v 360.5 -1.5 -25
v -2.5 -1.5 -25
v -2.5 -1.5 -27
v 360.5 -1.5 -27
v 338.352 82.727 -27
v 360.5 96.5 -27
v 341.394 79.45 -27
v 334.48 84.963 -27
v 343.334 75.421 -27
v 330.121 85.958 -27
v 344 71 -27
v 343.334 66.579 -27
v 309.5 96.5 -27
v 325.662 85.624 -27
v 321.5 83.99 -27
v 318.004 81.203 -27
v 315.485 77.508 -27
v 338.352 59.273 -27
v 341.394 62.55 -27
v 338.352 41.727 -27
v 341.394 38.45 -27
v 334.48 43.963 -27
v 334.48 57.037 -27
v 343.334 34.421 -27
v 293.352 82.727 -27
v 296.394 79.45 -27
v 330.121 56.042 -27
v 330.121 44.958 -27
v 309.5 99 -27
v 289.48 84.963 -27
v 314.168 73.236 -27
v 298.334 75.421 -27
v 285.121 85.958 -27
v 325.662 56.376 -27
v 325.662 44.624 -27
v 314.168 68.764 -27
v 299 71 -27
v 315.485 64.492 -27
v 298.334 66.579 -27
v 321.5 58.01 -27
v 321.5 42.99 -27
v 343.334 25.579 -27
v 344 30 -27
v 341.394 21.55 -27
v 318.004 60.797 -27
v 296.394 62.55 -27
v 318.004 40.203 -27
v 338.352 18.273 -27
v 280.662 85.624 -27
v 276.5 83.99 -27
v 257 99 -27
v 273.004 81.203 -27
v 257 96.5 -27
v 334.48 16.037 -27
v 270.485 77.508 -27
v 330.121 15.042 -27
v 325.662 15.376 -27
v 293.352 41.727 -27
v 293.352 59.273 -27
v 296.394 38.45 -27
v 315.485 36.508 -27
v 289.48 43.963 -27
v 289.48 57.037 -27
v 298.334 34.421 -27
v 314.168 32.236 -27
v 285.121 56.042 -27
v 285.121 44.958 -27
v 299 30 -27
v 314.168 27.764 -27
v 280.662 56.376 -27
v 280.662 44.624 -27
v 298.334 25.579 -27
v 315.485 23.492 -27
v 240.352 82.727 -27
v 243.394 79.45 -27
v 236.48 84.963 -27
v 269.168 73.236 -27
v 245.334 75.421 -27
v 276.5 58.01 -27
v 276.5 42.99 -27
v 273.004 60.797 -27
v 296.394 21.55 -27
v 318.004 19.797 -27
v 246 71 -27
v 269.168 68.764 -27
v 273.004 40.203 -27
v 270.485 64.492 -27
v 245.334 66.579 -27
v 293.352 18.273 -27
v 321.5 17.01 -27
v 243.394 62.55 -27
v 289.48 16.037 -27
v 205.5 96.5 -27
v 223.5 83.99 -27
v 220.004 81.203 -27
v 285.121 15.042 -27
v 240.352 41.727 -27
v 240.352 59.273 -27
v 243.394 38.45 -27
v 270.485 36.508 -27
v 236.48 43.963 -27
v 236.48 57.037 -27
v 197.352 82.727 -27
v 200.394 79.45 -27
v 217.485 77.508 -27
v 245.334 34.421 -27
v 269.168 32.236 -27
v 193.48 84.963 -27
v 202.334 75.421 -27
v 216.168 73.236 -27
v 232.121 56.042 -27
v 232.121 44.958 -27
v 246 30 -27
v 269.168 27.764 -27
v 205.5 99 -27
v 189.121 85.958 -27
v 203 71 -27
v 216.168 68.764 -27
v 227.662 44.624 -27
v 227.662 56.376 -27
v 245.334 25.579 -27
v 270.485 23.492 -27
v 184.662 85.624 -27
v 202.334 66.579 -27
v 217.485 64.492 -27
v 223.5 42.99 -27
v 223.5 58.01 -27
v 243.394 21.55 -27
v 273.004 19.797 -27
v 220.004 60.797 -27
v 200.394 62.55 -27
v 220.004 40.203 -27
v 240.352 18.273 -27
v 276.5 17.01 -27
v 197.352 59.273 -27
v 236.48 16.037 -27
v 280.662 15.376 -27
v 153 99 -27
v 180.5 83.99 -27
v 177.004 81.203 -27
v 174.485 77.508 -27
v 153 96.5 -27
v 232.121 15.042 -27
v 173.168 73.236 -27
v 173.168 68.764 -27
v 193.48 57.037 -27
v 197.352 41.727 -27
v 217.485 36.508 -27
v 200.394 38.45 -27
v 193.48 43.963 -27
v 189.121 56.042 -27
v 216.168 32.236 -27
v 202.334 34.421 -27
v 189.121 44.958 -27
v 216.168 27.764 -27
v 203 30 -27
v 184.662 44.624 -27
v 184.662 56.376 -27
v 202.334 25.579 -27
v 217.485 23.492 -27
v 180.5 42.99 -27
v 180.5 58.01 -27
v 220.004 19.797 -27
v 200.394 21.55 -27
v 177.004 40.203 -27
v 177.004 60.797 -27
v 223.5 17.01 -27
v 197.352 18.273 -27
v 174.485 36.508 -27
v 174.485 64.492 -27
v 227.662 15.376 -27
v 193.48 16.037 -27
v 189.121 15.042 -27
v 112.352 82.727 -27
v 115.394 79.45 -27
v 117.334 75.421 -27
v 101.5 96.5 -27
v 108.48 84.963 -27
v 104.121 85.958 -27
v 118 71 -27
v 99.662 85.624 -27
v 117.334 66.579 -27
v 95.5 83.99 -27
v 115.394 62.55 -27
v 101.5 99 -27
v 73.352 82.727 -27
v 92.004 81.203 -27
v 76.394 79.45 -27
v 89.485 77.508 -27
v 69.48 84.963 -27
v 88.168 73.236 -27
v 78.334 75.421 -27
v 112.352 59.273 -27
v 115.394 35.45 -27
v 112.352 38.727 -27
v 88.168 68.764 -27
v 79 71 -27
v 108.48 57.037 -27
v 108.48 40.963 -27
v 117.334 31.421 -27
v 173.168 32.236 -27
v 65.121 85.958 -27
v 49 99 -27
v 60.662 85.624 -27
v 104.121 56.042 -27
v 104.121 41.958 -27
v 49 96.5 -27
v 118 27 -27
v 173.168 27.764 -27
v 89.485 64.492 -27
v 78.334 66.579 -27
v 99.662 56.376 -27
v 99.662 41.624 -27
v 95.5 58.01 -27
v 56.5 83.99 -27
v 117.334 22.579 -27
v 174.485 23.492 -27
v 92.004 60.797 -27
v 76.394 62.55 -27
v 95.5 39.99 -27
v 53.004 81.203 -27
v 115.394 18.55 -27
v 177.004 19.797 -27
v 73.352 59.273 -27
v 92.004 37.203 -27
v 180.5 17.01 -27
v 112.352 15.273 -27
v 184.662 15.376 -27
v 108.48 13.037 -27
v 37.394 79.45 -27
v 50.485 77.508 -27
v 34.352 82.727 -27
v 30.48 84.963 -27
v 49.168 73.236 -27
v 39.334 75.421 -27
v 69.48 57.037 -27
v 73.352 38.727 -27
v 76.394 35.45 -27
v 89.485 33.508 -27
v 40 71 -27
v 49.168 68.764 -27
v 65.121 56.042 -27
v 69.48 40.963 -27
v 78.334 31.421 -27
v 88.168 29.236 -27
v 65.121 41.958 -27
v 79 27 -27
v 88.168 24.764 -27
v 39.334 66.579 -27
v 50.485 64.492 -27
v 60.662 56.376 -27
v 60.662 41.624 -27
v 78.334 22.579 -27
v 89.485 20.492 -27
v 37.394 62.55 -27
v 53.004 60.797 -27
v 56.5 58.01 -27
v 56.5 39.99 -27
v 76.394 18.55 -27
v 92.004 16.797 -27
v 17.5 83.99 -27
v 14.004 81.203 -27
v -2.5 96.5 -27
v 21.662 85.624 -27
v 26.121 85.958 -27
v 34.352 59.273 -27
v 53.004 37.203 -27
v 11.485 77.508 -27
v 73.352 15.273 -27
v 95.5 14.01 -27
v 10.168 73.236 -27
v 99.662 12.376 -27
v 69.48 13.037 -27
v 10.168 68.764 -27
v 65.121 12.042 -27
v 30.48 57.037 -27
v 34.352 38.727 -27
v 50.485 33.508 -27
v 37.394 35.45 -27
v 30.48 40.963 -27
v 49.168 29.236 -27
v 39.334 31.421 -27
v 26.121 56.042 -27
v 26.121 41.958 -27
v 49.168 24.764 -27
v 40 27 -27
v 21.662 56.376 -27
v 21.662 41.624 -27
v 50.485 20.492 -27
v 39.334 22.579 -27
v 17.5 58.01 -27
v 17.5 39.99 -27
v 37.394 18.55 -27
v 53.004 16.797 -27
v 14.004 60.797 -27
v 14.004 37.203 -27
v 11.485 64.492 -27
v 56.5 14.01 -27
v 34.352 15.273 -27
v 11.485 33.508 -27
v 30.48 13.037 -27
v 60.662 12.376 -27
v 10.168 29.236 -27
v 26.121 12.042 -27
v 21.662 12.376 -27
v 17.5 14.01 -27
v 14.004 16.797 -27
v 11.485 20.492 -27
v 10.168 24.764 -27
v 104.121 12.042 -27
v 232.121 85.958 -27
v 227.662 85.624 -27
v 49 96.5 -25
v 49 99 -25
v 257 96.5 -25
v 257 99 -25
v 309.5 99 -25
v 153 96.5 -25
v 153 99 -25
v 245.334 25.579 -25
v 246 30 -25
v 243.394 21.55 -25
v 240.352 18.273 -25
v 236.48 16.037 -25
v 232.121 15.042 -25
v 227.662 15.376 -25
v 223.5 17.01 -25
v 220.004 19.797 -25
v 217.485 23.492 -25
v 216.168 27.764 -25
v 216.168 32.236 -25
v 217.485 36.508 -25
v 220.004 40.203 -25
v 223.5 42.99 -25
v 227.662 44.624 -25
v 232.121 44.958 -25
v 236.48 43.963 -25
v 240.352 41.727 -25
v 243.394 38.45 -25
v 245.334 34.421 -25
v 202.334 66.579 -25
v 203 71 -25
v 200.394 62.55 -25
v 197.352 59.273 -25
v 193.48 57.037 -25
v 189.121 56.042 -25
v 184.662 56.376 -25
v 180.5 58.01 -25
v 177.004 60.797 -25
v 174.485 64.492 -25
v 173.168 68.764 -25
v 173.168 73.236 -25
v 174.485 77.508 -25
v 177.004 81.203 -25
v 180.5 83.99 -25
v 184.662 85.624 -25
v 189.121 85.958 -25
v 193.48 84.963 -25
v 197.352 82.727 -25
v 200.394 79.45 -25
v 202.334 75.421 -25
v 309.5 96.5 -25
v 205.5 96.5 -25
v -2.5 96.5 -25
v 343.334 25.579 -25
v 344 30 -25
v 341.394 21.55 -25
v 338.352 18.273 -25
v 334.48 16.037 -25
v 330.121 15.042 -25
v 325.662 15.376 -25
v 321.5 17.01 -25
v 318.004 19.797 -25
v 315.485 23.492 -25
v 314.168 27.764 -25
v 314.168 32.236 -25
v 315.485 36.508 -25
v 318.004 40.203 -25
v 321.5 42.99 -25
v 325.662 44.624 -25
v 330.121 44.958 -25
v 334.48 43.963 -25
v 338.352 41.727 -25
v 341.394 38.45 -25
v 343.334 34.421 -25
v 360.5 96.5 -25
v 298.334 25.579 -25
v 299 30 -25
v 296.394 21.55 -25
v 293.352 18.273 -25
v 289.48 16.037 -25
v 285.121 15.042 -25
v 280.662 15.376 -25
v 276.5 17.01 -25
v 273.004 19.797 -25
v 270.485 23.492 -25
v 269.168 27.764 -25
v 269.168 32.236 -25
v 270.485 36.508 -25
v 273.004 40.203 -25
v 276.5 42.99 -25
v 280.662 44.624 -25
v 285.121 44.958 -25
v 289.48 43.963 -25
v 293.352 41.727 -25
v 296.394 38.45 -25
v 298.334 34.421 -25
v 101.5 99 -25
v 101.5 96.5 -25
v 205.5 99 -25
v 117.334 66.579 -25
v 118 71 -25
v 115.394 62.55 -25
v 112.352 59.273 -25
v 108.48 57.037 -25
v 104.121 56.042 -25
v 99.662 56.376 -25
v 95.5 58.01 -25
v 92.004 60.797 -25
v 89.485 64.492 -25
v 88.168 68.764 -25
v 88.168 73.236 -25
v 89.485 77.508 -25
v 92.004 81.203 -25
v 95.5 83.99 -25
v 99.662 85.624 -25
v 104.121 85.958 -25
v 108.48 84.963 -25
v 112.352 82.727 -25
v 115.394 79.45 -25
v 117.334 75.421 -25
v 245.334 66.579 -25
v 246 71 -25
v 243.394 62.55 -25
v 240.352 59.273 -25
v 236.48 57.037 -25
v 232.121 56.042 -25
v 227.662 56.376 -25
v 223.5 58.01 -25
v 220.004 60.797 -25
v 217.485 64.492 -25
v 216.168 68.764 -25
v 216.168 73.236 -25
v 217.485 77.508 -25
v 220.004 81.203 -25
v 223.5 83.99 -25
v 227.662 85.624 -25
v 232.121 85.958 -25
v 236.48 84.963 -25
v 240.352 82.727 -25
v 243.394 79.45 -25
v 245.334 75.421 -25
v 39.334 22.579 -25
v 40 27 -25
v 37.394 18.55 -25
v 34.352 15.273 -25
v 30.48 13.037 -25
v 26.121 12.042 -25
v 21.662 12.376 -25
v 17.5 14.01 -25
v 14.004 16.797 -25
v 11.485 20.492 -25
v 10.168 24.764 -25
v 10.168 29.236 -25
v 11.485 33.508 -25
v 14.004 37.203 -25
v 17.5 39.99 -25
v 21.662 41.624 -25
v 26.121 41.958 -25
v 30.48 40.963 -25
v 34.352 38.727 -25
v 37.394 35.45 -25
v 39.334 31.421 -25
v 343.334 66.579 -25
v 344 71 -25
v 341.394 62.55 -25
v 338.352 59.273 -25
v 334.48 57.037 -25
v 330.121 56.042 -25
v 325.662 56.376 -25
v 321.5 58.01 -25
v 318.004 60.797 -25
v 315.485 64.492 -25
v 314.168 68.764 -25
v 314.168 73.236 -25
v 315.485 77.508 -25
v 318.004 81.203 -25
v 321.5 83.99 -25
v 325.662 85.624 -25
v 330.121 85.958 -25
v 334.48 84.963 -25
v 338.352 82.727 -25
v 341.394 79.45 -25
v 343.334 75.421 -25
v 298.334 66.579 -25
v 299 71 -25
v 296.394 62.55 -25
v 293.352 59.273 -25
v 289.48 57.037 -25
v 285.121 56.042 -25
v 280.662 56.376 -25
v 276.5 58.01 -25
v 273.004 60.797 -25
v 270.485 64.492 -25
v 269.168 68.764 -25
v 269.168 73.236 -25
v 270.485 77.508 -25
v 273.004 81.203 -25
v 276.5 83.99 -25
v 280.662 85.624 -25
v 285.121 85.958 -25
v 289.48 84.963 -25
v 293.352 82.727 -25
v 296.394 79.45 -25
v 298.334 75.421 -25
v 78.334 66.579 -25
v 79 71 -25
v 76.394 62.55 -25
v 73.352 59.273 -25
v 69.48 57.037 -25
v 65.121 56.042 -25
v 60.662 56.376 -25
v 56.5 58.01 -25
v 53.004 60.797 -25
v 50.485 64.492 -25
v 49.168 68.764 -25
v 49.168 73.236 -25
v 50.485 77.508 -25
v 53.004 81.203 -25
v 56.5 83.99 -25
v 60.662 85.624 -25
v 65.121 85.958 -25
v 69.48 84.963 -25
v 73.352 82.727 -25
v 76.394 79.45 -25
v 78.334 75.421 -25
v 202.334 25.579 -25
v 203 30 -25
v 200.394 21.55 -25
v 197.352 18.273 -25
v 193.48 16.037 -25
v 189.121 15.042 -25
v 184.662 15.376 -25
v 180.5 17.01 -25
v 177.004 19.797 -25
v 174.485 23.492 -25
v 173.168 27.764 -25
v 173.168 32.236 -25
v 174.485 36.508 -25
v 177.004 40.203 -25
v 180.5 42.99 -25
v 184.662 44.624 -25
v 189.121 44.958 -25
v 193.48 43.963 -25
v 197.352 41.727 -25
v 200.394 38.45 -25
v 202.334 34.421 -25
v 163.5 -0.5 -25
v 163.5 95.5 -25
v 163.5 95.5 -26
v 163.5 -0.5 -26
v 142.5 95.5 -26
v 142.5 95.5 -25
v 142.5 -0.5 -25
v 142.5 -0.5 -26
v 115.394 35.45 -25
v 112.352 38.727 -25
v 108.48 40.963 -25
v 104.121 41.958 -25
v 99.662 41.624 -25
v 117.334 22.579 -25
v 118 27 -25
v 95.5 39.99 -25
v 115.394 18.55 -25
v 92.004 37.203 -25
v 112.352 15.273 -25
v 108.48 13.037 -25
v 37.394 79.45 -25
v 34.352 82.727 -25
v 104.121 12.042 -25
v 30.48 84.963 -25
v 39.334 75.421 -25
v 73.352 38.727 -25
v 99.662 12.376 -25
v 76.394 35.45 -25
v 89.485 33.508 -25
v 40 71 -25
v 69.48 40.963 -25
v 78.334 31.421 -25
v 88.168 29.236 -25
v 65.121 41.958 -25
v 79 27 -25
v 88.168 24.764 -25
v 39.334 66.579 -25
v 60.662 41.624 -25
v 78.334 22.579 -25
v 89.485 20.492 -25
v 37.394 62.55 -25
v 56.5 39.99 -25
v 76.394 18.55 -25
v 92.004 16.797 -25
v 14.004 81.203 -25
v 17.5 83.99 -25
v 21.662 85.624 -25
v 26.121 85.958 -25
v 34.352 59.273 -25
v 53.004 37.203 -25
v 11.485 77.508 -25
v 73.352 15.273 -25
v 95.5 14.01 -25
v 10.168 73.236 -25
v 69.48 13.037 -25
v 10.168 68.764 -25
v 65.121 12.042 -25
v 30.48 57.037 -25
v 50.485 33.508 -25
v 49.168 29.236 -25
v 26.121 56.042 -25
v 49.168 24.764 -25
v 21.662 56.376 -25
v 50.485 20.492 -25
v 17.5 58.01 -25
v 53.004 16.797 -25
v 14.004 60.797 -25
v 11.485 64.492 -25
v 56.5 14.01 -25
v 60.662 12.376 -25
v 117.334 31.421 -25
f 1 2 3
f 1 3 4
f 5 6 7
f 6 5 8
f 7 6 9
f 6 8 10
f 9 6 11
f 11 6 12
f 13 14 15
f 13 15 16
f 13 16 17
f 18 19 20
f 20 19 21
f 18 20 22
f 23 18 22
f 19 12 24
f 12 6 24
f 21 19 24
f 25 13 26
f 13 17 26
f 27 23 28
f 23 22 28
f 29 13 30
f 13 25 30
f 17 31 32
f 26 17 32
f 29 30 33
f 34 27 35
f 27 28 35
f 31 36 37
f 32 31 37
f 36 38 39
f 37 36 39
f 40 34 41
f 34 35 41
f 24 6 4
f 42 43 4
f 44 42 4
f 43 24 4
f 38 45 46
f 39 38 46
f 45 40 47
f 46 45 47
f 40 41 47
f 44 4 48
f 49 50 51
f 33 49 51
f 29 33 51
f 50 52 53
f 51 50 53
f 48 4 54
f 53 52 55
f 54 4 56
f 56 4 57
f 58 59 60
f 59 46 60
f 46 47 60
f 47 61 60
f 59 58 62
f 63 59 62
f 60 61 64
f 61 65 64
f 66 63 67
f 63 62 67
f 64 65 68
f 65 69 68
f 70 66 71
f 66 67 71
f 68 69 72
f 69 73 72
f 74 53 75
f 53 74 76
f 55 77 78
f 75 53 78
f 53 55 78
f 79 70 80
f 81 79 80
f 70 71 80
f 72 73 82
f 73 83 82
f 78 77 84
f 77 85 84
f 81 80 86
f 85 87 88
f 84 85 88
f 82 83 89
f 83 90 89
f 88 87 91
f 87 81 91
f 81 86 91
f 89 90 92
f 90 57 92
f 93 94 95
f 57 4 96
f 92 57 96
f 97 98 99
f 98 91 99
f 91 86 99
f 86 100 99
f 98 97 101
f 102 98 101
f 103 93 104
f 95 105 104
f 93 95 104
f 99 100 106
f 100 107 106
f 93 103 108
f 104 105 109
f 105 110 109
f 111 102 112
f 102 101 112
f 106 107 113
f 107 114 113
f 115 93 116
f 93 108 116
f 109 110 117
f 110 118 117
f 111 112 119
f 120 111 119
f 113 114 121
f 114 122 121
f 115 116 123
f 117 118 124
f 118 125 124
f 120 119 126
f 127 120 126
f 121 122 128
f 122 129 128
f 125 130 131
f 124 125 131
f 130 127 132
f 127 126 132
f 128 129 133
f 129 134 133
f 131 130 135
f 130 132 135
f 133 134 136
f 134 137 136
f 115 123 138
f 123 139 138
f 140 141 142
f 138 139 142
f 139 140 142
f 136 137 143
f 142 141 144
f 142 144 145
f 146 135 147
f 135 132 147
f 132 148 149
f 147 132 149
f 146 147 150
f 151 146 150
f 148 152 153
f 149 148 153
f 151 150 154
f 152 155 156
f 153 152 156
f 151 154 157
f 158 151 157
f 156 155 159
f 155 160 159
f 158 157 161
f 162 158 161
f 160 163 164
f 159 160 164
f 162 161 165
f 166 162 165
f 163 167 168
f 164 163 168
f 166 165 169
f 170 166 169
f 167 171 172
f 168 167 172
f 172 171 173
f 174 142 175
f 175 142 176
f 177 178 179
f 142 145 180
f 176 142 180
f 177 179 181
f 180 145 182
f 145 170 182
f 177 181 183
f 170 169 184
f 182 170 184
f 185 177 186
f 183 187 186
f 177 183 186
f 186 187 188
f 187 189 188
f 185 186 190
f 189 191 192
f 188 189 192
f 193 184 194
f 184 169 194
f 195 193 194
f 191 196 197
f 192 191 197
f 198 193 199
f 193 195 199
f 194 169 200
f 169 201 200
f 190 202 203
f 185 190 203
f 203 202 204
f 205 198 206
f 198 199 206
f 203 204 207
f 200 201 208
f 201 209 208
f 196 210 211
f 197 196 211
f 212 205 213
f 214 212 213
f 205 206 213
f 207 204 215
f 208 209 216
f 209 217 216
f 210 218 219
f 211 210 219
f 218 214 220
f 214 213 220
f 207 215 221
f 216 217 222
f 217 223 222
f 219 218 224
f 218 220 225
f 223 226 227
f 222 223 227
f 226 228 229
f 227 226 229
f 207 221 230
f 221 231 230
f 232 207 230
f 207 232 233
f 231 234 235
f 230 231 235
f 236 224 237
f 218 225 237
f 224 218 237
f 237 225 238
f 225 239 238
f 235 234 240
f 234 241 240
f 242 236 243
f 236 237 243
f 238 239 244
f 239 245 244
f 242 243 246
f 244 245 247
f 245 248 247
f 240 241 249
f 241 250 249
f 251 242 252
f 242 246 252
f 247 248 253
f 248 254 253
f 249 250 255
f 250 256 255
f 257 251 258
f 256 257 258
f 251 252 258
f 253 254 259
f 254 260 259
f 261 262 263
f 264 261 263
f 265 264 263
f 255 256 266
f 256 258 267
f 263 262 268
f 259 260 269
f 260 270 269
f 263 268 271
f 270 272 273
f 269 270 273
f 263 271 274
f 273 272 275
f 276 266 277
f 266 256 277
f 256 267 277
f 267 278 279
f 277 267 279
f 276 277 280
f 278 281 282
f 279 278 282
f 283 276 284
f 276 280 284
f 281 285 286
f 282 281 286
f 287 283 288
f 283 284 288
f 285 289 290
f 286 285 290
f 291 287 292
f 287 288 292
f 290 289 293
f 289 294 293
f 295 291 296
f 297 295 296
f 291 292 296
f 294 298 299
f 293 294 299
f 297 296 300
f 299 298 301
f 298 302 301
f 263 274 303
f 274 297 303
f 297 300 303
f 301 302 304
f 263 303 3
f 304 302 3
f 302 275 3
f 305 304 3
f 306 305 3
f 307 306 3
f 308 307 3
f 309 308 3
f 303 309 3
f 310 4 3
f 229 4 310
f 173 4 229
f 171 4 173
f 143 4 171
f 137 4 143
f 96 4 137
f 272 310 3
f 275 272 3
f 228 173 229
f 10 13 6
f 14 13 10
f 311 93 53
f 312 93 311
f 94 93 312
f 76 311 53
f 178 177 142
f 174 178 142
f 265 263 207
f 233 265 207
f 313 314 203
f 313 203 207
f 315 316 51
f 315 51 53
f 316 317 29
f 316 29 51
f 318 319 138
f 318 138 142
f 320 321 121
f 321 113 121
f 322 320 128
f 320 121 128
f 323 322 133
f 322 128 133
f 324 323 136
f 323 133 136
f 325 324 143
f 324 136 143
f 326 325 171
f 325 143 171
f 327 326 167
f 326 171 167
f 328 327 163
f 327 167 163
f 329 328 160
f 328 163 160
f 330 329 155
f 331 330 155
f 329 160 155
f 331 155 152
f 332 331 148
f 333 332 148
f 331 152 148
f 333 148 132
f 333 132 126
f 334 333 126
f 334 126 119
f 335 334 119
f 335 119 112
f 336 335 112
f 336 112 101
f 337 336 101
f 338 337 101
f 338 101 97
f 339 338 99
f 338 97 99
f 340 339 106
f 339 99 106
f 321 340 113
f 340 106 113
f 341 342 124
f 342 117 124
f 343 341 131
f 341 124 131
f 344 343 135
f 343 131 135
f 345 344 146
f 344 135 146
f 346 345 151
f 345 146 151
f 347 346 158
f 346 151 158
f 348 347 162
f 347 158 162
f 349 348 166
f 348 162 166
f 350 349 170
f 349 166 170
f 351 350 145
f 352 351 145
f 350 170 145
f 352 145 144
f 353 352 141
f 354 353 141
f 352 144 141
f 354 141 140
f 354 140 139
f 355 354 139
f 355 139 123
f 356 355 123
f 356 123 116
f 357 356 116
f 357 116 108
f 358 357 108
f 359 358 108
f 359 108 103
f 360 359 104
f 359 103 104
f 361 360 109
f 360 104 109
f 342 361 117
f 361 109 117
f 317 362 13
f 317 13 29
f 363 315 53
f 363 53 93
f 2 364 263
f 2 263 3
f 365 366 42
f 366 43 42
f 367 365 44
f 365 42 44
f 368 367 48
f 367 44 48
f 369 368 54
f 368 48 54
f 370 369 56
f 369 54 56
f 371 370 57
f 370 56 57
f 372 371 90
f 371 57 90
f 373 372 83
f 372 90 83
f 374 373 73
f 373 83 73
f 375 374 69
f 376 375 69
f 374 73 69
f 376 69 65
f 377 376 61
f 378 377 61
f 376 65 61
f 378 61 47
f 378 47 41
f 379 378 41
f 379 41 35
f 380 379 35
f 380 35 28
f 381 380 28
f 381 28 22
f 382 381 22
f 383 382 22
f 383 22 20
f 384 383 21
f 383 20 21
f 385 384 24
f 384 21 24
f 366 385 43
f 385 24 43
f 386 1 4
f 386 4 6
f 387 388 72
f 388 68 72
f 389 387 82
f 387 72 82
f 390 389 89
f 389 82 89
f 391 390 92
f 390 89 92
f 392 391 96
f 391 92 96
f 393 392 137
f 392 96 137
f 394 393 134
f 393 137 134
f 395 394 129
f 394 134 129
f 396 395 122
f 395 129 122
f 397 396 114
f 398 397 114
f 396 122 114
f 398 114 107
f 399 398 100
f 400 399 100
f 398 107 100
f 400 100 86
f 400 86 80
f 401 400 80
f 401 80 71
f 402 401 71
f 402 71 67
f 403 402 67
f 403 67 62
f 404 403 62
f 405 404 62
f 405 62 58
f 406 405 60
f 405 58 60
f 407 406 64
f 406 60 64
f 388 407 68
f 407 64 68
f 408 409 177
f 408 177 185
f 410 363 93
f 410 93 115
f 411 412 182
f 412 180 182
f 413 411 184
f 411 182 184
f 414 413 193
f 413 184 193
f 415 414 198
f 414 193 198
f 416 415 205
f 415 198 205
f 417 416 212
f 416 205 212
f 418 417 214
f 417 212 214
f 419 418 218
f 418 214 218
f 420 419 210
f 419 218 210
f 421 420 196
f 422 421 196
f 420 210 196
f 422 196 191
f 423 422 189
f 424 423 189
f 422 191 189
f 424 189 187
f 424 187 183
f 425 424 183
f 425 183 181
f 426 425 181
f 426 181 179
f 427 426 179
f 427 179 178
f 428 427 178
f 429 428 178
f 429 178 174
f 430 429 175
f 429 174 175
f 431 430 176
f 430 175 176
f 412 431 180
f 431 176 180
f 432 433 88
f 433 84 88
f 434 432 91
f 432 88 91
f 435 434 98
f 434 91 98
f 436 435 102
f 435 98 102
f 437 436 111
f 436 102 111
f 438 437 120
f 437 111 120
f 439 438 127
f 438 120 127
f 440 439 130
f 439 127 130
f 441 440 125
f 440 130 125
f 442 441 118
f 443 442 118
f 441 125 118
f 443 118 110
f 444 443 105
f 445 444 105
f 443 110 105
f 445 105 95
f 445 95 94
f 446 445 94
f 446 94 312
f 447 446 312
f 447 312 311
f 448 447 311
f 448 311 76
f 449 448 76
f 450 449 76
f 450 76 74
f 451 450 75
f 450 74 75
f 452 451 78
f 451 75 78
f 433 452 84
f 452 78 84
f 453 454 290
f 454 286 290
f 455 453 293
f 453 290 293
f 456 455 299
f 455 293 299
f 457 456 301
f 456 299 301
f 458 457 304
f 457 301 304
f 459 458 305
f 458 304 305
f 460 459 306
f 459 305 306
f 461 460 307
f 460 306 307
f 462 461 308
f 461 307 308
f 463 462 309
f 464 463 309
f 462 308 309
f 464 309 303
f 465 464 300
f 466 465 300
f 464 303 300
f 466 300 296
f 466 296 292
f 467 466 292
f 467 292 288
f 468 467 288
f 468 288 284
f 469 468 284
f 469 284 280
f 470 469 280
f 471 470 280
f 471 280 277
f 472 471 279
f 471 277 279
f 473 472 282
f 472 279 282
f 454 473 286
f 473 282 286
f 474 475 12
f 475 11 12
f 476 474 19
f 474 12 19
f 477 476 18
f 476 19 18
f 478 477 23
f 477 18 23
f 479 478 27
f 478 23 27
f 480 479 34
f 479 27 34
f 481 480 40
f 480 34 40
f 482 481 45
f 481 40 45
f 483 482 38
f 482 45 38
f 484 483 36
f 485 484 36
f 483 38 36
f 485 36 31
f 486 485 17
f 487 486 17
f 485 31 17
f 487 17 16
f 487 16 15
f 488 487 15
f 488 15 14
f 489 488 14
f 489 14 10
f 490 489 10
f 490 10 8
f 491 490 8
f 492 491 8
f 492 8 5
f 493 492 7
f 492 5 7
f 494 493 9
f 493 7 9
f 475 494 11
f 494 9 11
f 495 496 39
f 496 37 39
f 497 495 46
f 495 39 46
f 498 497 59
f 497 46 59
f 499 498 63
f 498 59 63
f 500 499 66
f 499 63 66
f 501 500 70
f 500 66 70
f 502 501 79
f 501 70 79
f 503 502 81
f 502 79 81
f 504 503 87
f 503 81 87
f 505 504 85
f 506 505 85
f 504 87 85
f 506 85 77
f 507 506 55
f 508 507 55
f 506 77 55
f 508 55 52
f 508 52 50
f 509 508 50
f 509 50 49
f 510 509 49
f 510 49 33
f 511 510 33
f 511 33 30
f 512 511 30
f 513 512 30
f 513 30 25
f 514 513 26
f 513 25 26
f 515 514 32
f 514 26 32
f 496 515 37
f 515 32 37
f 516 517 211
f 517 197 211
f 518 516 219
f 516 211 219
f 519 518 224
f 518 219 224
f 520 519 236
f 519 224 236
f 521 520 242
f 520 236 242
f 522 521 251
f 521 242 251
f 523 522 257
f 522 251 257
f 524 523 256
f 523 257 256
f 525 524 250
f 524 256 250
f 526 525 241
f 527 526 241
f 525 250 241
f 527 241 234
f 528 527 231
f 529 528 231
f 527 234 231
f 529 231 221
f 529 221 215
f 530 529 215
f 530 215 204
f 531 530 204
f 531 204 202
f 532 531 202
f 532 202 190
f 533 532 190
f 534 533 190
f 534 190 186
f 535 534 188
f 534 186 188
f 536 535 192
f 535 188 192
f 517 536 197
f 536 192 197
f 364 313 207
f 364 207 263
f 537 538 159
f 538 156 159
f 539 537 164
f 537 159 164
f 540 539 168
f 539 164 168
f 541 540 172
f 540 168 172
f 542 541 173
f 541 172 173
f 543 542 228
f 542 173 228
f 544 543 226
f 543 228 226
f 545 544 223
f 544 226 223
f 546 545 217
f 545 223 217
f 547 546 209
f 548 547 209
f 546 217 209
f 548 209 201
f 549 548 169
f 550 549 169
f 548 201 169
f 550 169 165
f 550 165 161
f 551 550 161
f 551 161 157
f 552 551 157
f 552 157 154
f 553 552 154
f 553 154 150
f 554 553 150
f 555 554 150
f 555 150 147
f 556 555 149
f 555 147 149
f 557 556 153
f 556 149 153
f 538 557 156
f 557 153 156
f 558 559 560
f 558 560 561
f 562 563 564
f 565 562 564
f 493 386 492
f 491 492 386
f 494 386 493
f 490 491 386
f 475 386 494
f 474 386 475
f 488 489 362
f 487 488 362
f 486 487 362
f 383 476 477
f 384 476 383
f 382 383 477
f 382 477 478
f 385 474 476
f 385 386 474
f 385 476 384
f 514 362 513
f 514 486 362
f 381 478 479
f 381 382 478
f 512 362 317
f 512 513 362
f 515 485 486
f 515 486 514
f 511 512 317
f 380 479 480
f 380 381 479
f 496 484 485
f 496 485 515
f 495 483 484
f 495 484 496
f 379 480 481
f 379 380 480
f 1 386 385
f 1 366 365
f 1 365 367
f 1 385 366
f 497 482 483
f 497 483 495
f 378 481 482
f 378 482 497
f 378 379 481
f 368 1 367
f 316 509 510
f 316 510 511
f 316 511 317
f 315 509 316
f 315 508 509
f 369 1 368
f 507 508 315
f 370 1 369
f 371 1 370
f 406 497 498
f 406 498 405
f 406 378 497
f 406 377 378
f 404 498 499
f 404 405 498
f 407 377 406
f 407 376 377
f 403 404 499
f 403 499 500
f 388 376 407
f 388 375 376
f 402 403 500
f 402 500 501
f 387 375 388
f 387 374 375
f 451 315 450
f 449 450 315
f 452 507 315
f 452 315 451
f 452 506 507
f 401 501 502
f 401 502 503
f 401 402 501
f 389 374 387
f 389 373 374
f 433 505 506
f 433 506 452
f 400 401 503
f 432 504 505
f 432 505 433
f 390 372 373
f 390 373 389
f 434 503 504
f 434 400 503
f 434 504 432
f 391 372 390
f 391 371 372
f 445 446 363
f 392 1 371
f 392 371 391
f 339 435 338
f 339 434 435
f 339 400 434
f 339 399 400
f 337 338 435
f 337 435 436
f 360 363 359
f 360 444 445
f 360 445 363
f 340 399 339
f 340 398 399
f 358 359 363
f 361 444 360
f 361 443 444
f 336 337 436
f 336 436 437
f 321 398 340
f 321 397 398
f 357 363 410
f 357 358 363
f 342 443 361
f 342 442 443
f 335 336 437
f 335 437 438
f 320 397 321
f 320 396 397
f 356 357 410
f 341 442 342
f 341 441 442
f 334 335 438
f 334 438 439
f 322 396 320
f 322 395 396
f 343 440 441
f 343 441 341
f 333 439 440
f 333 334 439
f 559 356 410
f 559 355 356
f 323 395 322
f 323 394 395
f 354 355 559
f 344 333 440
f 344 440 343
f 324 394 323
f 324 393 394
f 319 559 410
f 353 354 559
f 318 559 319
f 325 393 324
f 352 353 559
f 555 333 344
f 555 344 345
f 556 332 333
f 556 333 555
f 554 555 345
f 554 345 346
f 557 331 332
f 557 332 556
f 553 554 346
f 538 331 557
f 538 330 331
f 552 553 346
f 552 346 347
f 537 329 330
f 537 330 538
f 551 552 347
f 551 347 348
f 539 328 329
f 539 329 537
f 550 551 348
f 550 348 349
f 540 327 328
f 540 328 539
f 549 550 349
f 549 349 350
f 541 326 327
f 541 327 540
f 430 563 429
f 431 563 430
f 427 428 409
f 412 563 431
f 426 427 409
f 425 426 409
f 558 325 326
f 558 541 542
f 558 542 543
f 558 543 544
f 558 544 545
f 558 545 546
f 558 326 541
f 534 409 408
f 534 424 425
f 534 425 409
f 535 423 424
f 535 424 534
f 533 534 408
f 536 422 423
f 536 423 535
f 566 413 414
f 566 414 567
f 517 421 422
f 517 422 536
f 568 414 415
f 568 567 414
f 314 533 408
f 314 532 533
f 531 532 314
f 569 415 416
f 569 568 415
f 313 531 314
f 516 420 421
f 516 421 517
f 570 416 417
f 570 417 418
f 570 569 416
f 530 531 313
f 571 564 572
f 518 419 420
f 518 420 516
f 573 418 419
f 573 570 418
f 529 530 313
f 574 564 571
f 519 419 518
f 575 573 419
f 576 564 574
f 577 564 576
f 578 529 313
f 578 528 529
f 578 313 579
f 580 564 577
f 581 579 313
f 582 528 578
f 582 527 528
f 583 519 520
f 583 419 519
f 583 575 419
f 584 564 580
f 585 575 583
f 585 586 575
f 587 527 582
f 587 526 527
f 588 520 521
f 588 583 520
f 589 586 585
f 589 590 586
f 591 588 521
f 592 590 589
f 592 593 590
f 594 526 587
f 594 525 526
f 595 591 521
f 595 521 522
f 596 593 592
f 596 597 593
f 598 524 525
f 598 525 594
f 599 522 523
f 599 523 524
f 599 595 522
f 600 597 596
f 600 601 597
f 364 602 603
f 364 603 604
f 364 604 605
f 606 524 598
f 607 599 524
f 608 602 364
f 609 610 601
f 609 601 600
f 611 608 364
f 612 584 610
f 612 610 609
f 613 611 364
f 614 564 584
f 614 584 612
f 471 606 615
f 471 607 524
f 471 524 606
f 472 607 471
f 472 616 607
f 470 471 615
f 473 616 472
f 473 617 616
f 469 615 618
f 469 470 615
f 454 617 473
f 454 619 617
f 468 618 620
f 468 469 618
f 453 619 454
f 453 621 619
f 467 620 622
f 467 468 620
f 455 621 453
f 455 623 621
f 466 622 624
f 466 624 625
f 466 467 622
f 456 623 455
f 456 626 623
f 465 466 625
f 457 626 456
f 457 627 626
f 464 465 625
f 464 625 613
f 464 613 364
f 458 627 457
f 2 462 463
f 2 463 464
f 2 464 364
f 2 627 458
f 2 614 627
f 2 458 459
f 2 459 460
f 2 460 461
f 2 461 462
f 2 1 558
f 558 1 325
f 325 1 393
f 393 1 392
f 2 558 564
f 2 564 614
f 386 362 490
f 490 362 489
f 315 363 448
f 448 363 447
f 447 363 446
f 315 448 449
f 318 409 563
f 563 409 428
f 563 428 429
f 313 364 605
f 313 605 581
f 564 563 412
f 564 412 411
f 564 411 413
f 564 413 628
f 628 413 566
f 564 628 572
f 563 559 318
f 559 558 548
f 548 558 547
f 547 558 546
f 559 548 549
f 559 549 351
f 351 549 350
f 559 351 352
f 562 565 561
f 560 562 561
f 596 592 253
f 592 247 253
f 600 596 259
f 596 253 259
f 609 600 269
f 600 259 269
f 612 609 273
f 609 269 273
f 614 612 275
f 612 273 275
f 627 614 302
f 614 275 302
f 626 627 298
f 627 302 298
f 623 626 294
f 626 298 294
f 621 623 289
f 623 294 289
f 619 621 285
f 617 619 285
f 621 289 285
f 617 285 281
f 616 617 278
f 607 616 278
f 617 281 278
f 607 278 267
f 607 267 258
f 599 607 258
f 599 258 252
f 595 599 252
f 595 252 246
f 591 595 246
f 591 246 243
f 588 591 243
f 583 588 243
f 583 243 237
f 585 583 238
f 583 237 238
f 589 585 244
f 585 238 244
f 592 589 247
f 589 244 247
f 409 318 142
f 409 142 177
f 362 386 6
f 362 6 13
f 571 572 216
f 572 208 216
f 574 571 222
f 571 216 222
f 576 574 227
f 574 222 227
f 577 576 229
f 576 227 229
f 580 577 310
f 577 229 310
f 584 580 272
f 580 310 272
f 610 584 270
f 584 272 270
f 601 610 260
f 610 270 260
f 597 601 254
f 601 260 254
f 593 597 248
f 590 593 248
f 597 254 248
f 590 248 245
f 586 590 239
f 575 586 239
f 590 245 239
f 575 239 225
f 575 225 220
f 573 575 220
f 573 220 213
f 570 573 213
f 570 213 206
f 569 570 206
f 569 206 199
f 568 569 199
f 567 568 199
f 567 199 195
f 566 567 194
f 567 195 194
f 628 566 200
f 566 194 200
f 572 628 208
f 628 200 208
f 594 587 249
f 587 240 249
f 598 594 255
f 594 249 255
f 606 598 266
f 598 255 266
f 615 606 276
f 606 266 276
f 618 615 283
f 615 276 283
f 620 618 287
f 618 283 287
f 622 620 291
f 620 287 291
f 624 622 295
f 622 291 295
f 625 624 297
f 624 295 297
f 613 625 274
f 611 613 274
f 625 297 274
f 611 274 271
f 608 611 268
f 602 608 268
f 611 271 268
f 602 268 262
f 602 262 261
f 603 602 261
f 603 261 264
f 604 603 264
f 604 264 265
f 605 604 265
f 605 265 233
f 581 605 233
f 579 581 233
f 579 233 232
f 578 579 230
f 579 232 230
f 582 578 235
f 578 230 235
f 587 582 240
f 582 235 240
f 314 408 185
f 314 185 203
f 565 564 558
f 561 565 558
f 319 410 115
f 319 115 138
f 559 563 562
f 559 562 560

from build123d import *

# Parameters (mm, degrees)
SKETCH093_W           = 21
SKETCH093_H           = 96
EXTRUDE085_DEPTH      = 1
SKETCH140_R           = 15
EXTRUDE130_DEPTH      = 3
EXTRUDE130_DEPTH_BACK = 1
EXTRUDE074_DEPTH      = 2


with BuildPart() as cutout:
    # Sketch093 → Extrude085 (new body)
    with BuildSketch(Plane(origin=(0, 0, -25), x_dir=(1, 0, 0), z_dir=(0, 0, -1))):
        with Locations((153, -47.5)):
            Rectangle(SKETCH093_W, SKETCH093_H)
    extrude(amount=EXTRUDE085_DEPTH)


with BuildPart() as compound029:
    # Sketch140 → Extrude130 (new body, two sides)
    with BuildSketch(Plane(origin=(0, 0, -25), x_dir=(1, 0, 0), z_dir=(0, 0, -1))) as extrude130_sk:
        with Locations((25, -27)):
            Circle(SKETCH140_R)
        with Locations((103, -27)):
            Circle(SKETCH140_R)
        with Locations((64, -27)):
            Circle(SKETCH140_R)
        with Locations((103, -71)):
            Circle(SKETCH140_R)
        with Locations((25, -71)):
            Circle(SKETCH140_R)
        with Locations((64, -71)):
            Circle(SKETCH140_R)
        with Locations((188, -30)):
            Circle(SKETCH140_R)
        with Locations((231, -30)):
            Circle(SKETCH140_R)
        with Locations((188, -71)):
            Circle(SKETCH140_R)
        with Locations((231, -71)):
            Circle(SKETCH140_R)
        with Locations((284, -30)):
            Circle(SKETCH140_R)
        with Locations((329, -30)):
            Circle(SKETCH140_R)
        with Locations((284, -71)):
            Circle(SKETCH140_R)
        with Locations((329, -71)):
            Circle(SKETCH140_R)
    extrude(amount=EXTRUDE130_DEPTH)
    extrude(extrude130_sk.sketch, amount=-EXTRUDE130_DEPTH_BACK)

    # Compound029: union cutout
    add(cutout.part)


with BuildPart() as panel002:
    # Sketch082 → Extrude074 (new body)
    with BuildSketch(Plane(origin=(0, 0, -25), x_dir=(1, 0, 0), z_dir=(0, 0, -1))):
        Polygon((-2.5, 1.5), (360.5, 1.5), (360.5, -96.5), (309.5, -96.5), (309.5, -99), (257, -99), (257, -96.5), (205.5, -96.5), (205.5, -99), (153, -99), (153, -96.5), (101.5, -96.5), (101.5, -99), (49, -99), (49, -96.5), (-2.5, -96.5), align=None)
    extrude(amount=EXTRUDE074_DEPTH)

    # Cut: cut Compound029
    add(compound029.part, mode=Mode.SUBTRACT)


solid = panel002.part
